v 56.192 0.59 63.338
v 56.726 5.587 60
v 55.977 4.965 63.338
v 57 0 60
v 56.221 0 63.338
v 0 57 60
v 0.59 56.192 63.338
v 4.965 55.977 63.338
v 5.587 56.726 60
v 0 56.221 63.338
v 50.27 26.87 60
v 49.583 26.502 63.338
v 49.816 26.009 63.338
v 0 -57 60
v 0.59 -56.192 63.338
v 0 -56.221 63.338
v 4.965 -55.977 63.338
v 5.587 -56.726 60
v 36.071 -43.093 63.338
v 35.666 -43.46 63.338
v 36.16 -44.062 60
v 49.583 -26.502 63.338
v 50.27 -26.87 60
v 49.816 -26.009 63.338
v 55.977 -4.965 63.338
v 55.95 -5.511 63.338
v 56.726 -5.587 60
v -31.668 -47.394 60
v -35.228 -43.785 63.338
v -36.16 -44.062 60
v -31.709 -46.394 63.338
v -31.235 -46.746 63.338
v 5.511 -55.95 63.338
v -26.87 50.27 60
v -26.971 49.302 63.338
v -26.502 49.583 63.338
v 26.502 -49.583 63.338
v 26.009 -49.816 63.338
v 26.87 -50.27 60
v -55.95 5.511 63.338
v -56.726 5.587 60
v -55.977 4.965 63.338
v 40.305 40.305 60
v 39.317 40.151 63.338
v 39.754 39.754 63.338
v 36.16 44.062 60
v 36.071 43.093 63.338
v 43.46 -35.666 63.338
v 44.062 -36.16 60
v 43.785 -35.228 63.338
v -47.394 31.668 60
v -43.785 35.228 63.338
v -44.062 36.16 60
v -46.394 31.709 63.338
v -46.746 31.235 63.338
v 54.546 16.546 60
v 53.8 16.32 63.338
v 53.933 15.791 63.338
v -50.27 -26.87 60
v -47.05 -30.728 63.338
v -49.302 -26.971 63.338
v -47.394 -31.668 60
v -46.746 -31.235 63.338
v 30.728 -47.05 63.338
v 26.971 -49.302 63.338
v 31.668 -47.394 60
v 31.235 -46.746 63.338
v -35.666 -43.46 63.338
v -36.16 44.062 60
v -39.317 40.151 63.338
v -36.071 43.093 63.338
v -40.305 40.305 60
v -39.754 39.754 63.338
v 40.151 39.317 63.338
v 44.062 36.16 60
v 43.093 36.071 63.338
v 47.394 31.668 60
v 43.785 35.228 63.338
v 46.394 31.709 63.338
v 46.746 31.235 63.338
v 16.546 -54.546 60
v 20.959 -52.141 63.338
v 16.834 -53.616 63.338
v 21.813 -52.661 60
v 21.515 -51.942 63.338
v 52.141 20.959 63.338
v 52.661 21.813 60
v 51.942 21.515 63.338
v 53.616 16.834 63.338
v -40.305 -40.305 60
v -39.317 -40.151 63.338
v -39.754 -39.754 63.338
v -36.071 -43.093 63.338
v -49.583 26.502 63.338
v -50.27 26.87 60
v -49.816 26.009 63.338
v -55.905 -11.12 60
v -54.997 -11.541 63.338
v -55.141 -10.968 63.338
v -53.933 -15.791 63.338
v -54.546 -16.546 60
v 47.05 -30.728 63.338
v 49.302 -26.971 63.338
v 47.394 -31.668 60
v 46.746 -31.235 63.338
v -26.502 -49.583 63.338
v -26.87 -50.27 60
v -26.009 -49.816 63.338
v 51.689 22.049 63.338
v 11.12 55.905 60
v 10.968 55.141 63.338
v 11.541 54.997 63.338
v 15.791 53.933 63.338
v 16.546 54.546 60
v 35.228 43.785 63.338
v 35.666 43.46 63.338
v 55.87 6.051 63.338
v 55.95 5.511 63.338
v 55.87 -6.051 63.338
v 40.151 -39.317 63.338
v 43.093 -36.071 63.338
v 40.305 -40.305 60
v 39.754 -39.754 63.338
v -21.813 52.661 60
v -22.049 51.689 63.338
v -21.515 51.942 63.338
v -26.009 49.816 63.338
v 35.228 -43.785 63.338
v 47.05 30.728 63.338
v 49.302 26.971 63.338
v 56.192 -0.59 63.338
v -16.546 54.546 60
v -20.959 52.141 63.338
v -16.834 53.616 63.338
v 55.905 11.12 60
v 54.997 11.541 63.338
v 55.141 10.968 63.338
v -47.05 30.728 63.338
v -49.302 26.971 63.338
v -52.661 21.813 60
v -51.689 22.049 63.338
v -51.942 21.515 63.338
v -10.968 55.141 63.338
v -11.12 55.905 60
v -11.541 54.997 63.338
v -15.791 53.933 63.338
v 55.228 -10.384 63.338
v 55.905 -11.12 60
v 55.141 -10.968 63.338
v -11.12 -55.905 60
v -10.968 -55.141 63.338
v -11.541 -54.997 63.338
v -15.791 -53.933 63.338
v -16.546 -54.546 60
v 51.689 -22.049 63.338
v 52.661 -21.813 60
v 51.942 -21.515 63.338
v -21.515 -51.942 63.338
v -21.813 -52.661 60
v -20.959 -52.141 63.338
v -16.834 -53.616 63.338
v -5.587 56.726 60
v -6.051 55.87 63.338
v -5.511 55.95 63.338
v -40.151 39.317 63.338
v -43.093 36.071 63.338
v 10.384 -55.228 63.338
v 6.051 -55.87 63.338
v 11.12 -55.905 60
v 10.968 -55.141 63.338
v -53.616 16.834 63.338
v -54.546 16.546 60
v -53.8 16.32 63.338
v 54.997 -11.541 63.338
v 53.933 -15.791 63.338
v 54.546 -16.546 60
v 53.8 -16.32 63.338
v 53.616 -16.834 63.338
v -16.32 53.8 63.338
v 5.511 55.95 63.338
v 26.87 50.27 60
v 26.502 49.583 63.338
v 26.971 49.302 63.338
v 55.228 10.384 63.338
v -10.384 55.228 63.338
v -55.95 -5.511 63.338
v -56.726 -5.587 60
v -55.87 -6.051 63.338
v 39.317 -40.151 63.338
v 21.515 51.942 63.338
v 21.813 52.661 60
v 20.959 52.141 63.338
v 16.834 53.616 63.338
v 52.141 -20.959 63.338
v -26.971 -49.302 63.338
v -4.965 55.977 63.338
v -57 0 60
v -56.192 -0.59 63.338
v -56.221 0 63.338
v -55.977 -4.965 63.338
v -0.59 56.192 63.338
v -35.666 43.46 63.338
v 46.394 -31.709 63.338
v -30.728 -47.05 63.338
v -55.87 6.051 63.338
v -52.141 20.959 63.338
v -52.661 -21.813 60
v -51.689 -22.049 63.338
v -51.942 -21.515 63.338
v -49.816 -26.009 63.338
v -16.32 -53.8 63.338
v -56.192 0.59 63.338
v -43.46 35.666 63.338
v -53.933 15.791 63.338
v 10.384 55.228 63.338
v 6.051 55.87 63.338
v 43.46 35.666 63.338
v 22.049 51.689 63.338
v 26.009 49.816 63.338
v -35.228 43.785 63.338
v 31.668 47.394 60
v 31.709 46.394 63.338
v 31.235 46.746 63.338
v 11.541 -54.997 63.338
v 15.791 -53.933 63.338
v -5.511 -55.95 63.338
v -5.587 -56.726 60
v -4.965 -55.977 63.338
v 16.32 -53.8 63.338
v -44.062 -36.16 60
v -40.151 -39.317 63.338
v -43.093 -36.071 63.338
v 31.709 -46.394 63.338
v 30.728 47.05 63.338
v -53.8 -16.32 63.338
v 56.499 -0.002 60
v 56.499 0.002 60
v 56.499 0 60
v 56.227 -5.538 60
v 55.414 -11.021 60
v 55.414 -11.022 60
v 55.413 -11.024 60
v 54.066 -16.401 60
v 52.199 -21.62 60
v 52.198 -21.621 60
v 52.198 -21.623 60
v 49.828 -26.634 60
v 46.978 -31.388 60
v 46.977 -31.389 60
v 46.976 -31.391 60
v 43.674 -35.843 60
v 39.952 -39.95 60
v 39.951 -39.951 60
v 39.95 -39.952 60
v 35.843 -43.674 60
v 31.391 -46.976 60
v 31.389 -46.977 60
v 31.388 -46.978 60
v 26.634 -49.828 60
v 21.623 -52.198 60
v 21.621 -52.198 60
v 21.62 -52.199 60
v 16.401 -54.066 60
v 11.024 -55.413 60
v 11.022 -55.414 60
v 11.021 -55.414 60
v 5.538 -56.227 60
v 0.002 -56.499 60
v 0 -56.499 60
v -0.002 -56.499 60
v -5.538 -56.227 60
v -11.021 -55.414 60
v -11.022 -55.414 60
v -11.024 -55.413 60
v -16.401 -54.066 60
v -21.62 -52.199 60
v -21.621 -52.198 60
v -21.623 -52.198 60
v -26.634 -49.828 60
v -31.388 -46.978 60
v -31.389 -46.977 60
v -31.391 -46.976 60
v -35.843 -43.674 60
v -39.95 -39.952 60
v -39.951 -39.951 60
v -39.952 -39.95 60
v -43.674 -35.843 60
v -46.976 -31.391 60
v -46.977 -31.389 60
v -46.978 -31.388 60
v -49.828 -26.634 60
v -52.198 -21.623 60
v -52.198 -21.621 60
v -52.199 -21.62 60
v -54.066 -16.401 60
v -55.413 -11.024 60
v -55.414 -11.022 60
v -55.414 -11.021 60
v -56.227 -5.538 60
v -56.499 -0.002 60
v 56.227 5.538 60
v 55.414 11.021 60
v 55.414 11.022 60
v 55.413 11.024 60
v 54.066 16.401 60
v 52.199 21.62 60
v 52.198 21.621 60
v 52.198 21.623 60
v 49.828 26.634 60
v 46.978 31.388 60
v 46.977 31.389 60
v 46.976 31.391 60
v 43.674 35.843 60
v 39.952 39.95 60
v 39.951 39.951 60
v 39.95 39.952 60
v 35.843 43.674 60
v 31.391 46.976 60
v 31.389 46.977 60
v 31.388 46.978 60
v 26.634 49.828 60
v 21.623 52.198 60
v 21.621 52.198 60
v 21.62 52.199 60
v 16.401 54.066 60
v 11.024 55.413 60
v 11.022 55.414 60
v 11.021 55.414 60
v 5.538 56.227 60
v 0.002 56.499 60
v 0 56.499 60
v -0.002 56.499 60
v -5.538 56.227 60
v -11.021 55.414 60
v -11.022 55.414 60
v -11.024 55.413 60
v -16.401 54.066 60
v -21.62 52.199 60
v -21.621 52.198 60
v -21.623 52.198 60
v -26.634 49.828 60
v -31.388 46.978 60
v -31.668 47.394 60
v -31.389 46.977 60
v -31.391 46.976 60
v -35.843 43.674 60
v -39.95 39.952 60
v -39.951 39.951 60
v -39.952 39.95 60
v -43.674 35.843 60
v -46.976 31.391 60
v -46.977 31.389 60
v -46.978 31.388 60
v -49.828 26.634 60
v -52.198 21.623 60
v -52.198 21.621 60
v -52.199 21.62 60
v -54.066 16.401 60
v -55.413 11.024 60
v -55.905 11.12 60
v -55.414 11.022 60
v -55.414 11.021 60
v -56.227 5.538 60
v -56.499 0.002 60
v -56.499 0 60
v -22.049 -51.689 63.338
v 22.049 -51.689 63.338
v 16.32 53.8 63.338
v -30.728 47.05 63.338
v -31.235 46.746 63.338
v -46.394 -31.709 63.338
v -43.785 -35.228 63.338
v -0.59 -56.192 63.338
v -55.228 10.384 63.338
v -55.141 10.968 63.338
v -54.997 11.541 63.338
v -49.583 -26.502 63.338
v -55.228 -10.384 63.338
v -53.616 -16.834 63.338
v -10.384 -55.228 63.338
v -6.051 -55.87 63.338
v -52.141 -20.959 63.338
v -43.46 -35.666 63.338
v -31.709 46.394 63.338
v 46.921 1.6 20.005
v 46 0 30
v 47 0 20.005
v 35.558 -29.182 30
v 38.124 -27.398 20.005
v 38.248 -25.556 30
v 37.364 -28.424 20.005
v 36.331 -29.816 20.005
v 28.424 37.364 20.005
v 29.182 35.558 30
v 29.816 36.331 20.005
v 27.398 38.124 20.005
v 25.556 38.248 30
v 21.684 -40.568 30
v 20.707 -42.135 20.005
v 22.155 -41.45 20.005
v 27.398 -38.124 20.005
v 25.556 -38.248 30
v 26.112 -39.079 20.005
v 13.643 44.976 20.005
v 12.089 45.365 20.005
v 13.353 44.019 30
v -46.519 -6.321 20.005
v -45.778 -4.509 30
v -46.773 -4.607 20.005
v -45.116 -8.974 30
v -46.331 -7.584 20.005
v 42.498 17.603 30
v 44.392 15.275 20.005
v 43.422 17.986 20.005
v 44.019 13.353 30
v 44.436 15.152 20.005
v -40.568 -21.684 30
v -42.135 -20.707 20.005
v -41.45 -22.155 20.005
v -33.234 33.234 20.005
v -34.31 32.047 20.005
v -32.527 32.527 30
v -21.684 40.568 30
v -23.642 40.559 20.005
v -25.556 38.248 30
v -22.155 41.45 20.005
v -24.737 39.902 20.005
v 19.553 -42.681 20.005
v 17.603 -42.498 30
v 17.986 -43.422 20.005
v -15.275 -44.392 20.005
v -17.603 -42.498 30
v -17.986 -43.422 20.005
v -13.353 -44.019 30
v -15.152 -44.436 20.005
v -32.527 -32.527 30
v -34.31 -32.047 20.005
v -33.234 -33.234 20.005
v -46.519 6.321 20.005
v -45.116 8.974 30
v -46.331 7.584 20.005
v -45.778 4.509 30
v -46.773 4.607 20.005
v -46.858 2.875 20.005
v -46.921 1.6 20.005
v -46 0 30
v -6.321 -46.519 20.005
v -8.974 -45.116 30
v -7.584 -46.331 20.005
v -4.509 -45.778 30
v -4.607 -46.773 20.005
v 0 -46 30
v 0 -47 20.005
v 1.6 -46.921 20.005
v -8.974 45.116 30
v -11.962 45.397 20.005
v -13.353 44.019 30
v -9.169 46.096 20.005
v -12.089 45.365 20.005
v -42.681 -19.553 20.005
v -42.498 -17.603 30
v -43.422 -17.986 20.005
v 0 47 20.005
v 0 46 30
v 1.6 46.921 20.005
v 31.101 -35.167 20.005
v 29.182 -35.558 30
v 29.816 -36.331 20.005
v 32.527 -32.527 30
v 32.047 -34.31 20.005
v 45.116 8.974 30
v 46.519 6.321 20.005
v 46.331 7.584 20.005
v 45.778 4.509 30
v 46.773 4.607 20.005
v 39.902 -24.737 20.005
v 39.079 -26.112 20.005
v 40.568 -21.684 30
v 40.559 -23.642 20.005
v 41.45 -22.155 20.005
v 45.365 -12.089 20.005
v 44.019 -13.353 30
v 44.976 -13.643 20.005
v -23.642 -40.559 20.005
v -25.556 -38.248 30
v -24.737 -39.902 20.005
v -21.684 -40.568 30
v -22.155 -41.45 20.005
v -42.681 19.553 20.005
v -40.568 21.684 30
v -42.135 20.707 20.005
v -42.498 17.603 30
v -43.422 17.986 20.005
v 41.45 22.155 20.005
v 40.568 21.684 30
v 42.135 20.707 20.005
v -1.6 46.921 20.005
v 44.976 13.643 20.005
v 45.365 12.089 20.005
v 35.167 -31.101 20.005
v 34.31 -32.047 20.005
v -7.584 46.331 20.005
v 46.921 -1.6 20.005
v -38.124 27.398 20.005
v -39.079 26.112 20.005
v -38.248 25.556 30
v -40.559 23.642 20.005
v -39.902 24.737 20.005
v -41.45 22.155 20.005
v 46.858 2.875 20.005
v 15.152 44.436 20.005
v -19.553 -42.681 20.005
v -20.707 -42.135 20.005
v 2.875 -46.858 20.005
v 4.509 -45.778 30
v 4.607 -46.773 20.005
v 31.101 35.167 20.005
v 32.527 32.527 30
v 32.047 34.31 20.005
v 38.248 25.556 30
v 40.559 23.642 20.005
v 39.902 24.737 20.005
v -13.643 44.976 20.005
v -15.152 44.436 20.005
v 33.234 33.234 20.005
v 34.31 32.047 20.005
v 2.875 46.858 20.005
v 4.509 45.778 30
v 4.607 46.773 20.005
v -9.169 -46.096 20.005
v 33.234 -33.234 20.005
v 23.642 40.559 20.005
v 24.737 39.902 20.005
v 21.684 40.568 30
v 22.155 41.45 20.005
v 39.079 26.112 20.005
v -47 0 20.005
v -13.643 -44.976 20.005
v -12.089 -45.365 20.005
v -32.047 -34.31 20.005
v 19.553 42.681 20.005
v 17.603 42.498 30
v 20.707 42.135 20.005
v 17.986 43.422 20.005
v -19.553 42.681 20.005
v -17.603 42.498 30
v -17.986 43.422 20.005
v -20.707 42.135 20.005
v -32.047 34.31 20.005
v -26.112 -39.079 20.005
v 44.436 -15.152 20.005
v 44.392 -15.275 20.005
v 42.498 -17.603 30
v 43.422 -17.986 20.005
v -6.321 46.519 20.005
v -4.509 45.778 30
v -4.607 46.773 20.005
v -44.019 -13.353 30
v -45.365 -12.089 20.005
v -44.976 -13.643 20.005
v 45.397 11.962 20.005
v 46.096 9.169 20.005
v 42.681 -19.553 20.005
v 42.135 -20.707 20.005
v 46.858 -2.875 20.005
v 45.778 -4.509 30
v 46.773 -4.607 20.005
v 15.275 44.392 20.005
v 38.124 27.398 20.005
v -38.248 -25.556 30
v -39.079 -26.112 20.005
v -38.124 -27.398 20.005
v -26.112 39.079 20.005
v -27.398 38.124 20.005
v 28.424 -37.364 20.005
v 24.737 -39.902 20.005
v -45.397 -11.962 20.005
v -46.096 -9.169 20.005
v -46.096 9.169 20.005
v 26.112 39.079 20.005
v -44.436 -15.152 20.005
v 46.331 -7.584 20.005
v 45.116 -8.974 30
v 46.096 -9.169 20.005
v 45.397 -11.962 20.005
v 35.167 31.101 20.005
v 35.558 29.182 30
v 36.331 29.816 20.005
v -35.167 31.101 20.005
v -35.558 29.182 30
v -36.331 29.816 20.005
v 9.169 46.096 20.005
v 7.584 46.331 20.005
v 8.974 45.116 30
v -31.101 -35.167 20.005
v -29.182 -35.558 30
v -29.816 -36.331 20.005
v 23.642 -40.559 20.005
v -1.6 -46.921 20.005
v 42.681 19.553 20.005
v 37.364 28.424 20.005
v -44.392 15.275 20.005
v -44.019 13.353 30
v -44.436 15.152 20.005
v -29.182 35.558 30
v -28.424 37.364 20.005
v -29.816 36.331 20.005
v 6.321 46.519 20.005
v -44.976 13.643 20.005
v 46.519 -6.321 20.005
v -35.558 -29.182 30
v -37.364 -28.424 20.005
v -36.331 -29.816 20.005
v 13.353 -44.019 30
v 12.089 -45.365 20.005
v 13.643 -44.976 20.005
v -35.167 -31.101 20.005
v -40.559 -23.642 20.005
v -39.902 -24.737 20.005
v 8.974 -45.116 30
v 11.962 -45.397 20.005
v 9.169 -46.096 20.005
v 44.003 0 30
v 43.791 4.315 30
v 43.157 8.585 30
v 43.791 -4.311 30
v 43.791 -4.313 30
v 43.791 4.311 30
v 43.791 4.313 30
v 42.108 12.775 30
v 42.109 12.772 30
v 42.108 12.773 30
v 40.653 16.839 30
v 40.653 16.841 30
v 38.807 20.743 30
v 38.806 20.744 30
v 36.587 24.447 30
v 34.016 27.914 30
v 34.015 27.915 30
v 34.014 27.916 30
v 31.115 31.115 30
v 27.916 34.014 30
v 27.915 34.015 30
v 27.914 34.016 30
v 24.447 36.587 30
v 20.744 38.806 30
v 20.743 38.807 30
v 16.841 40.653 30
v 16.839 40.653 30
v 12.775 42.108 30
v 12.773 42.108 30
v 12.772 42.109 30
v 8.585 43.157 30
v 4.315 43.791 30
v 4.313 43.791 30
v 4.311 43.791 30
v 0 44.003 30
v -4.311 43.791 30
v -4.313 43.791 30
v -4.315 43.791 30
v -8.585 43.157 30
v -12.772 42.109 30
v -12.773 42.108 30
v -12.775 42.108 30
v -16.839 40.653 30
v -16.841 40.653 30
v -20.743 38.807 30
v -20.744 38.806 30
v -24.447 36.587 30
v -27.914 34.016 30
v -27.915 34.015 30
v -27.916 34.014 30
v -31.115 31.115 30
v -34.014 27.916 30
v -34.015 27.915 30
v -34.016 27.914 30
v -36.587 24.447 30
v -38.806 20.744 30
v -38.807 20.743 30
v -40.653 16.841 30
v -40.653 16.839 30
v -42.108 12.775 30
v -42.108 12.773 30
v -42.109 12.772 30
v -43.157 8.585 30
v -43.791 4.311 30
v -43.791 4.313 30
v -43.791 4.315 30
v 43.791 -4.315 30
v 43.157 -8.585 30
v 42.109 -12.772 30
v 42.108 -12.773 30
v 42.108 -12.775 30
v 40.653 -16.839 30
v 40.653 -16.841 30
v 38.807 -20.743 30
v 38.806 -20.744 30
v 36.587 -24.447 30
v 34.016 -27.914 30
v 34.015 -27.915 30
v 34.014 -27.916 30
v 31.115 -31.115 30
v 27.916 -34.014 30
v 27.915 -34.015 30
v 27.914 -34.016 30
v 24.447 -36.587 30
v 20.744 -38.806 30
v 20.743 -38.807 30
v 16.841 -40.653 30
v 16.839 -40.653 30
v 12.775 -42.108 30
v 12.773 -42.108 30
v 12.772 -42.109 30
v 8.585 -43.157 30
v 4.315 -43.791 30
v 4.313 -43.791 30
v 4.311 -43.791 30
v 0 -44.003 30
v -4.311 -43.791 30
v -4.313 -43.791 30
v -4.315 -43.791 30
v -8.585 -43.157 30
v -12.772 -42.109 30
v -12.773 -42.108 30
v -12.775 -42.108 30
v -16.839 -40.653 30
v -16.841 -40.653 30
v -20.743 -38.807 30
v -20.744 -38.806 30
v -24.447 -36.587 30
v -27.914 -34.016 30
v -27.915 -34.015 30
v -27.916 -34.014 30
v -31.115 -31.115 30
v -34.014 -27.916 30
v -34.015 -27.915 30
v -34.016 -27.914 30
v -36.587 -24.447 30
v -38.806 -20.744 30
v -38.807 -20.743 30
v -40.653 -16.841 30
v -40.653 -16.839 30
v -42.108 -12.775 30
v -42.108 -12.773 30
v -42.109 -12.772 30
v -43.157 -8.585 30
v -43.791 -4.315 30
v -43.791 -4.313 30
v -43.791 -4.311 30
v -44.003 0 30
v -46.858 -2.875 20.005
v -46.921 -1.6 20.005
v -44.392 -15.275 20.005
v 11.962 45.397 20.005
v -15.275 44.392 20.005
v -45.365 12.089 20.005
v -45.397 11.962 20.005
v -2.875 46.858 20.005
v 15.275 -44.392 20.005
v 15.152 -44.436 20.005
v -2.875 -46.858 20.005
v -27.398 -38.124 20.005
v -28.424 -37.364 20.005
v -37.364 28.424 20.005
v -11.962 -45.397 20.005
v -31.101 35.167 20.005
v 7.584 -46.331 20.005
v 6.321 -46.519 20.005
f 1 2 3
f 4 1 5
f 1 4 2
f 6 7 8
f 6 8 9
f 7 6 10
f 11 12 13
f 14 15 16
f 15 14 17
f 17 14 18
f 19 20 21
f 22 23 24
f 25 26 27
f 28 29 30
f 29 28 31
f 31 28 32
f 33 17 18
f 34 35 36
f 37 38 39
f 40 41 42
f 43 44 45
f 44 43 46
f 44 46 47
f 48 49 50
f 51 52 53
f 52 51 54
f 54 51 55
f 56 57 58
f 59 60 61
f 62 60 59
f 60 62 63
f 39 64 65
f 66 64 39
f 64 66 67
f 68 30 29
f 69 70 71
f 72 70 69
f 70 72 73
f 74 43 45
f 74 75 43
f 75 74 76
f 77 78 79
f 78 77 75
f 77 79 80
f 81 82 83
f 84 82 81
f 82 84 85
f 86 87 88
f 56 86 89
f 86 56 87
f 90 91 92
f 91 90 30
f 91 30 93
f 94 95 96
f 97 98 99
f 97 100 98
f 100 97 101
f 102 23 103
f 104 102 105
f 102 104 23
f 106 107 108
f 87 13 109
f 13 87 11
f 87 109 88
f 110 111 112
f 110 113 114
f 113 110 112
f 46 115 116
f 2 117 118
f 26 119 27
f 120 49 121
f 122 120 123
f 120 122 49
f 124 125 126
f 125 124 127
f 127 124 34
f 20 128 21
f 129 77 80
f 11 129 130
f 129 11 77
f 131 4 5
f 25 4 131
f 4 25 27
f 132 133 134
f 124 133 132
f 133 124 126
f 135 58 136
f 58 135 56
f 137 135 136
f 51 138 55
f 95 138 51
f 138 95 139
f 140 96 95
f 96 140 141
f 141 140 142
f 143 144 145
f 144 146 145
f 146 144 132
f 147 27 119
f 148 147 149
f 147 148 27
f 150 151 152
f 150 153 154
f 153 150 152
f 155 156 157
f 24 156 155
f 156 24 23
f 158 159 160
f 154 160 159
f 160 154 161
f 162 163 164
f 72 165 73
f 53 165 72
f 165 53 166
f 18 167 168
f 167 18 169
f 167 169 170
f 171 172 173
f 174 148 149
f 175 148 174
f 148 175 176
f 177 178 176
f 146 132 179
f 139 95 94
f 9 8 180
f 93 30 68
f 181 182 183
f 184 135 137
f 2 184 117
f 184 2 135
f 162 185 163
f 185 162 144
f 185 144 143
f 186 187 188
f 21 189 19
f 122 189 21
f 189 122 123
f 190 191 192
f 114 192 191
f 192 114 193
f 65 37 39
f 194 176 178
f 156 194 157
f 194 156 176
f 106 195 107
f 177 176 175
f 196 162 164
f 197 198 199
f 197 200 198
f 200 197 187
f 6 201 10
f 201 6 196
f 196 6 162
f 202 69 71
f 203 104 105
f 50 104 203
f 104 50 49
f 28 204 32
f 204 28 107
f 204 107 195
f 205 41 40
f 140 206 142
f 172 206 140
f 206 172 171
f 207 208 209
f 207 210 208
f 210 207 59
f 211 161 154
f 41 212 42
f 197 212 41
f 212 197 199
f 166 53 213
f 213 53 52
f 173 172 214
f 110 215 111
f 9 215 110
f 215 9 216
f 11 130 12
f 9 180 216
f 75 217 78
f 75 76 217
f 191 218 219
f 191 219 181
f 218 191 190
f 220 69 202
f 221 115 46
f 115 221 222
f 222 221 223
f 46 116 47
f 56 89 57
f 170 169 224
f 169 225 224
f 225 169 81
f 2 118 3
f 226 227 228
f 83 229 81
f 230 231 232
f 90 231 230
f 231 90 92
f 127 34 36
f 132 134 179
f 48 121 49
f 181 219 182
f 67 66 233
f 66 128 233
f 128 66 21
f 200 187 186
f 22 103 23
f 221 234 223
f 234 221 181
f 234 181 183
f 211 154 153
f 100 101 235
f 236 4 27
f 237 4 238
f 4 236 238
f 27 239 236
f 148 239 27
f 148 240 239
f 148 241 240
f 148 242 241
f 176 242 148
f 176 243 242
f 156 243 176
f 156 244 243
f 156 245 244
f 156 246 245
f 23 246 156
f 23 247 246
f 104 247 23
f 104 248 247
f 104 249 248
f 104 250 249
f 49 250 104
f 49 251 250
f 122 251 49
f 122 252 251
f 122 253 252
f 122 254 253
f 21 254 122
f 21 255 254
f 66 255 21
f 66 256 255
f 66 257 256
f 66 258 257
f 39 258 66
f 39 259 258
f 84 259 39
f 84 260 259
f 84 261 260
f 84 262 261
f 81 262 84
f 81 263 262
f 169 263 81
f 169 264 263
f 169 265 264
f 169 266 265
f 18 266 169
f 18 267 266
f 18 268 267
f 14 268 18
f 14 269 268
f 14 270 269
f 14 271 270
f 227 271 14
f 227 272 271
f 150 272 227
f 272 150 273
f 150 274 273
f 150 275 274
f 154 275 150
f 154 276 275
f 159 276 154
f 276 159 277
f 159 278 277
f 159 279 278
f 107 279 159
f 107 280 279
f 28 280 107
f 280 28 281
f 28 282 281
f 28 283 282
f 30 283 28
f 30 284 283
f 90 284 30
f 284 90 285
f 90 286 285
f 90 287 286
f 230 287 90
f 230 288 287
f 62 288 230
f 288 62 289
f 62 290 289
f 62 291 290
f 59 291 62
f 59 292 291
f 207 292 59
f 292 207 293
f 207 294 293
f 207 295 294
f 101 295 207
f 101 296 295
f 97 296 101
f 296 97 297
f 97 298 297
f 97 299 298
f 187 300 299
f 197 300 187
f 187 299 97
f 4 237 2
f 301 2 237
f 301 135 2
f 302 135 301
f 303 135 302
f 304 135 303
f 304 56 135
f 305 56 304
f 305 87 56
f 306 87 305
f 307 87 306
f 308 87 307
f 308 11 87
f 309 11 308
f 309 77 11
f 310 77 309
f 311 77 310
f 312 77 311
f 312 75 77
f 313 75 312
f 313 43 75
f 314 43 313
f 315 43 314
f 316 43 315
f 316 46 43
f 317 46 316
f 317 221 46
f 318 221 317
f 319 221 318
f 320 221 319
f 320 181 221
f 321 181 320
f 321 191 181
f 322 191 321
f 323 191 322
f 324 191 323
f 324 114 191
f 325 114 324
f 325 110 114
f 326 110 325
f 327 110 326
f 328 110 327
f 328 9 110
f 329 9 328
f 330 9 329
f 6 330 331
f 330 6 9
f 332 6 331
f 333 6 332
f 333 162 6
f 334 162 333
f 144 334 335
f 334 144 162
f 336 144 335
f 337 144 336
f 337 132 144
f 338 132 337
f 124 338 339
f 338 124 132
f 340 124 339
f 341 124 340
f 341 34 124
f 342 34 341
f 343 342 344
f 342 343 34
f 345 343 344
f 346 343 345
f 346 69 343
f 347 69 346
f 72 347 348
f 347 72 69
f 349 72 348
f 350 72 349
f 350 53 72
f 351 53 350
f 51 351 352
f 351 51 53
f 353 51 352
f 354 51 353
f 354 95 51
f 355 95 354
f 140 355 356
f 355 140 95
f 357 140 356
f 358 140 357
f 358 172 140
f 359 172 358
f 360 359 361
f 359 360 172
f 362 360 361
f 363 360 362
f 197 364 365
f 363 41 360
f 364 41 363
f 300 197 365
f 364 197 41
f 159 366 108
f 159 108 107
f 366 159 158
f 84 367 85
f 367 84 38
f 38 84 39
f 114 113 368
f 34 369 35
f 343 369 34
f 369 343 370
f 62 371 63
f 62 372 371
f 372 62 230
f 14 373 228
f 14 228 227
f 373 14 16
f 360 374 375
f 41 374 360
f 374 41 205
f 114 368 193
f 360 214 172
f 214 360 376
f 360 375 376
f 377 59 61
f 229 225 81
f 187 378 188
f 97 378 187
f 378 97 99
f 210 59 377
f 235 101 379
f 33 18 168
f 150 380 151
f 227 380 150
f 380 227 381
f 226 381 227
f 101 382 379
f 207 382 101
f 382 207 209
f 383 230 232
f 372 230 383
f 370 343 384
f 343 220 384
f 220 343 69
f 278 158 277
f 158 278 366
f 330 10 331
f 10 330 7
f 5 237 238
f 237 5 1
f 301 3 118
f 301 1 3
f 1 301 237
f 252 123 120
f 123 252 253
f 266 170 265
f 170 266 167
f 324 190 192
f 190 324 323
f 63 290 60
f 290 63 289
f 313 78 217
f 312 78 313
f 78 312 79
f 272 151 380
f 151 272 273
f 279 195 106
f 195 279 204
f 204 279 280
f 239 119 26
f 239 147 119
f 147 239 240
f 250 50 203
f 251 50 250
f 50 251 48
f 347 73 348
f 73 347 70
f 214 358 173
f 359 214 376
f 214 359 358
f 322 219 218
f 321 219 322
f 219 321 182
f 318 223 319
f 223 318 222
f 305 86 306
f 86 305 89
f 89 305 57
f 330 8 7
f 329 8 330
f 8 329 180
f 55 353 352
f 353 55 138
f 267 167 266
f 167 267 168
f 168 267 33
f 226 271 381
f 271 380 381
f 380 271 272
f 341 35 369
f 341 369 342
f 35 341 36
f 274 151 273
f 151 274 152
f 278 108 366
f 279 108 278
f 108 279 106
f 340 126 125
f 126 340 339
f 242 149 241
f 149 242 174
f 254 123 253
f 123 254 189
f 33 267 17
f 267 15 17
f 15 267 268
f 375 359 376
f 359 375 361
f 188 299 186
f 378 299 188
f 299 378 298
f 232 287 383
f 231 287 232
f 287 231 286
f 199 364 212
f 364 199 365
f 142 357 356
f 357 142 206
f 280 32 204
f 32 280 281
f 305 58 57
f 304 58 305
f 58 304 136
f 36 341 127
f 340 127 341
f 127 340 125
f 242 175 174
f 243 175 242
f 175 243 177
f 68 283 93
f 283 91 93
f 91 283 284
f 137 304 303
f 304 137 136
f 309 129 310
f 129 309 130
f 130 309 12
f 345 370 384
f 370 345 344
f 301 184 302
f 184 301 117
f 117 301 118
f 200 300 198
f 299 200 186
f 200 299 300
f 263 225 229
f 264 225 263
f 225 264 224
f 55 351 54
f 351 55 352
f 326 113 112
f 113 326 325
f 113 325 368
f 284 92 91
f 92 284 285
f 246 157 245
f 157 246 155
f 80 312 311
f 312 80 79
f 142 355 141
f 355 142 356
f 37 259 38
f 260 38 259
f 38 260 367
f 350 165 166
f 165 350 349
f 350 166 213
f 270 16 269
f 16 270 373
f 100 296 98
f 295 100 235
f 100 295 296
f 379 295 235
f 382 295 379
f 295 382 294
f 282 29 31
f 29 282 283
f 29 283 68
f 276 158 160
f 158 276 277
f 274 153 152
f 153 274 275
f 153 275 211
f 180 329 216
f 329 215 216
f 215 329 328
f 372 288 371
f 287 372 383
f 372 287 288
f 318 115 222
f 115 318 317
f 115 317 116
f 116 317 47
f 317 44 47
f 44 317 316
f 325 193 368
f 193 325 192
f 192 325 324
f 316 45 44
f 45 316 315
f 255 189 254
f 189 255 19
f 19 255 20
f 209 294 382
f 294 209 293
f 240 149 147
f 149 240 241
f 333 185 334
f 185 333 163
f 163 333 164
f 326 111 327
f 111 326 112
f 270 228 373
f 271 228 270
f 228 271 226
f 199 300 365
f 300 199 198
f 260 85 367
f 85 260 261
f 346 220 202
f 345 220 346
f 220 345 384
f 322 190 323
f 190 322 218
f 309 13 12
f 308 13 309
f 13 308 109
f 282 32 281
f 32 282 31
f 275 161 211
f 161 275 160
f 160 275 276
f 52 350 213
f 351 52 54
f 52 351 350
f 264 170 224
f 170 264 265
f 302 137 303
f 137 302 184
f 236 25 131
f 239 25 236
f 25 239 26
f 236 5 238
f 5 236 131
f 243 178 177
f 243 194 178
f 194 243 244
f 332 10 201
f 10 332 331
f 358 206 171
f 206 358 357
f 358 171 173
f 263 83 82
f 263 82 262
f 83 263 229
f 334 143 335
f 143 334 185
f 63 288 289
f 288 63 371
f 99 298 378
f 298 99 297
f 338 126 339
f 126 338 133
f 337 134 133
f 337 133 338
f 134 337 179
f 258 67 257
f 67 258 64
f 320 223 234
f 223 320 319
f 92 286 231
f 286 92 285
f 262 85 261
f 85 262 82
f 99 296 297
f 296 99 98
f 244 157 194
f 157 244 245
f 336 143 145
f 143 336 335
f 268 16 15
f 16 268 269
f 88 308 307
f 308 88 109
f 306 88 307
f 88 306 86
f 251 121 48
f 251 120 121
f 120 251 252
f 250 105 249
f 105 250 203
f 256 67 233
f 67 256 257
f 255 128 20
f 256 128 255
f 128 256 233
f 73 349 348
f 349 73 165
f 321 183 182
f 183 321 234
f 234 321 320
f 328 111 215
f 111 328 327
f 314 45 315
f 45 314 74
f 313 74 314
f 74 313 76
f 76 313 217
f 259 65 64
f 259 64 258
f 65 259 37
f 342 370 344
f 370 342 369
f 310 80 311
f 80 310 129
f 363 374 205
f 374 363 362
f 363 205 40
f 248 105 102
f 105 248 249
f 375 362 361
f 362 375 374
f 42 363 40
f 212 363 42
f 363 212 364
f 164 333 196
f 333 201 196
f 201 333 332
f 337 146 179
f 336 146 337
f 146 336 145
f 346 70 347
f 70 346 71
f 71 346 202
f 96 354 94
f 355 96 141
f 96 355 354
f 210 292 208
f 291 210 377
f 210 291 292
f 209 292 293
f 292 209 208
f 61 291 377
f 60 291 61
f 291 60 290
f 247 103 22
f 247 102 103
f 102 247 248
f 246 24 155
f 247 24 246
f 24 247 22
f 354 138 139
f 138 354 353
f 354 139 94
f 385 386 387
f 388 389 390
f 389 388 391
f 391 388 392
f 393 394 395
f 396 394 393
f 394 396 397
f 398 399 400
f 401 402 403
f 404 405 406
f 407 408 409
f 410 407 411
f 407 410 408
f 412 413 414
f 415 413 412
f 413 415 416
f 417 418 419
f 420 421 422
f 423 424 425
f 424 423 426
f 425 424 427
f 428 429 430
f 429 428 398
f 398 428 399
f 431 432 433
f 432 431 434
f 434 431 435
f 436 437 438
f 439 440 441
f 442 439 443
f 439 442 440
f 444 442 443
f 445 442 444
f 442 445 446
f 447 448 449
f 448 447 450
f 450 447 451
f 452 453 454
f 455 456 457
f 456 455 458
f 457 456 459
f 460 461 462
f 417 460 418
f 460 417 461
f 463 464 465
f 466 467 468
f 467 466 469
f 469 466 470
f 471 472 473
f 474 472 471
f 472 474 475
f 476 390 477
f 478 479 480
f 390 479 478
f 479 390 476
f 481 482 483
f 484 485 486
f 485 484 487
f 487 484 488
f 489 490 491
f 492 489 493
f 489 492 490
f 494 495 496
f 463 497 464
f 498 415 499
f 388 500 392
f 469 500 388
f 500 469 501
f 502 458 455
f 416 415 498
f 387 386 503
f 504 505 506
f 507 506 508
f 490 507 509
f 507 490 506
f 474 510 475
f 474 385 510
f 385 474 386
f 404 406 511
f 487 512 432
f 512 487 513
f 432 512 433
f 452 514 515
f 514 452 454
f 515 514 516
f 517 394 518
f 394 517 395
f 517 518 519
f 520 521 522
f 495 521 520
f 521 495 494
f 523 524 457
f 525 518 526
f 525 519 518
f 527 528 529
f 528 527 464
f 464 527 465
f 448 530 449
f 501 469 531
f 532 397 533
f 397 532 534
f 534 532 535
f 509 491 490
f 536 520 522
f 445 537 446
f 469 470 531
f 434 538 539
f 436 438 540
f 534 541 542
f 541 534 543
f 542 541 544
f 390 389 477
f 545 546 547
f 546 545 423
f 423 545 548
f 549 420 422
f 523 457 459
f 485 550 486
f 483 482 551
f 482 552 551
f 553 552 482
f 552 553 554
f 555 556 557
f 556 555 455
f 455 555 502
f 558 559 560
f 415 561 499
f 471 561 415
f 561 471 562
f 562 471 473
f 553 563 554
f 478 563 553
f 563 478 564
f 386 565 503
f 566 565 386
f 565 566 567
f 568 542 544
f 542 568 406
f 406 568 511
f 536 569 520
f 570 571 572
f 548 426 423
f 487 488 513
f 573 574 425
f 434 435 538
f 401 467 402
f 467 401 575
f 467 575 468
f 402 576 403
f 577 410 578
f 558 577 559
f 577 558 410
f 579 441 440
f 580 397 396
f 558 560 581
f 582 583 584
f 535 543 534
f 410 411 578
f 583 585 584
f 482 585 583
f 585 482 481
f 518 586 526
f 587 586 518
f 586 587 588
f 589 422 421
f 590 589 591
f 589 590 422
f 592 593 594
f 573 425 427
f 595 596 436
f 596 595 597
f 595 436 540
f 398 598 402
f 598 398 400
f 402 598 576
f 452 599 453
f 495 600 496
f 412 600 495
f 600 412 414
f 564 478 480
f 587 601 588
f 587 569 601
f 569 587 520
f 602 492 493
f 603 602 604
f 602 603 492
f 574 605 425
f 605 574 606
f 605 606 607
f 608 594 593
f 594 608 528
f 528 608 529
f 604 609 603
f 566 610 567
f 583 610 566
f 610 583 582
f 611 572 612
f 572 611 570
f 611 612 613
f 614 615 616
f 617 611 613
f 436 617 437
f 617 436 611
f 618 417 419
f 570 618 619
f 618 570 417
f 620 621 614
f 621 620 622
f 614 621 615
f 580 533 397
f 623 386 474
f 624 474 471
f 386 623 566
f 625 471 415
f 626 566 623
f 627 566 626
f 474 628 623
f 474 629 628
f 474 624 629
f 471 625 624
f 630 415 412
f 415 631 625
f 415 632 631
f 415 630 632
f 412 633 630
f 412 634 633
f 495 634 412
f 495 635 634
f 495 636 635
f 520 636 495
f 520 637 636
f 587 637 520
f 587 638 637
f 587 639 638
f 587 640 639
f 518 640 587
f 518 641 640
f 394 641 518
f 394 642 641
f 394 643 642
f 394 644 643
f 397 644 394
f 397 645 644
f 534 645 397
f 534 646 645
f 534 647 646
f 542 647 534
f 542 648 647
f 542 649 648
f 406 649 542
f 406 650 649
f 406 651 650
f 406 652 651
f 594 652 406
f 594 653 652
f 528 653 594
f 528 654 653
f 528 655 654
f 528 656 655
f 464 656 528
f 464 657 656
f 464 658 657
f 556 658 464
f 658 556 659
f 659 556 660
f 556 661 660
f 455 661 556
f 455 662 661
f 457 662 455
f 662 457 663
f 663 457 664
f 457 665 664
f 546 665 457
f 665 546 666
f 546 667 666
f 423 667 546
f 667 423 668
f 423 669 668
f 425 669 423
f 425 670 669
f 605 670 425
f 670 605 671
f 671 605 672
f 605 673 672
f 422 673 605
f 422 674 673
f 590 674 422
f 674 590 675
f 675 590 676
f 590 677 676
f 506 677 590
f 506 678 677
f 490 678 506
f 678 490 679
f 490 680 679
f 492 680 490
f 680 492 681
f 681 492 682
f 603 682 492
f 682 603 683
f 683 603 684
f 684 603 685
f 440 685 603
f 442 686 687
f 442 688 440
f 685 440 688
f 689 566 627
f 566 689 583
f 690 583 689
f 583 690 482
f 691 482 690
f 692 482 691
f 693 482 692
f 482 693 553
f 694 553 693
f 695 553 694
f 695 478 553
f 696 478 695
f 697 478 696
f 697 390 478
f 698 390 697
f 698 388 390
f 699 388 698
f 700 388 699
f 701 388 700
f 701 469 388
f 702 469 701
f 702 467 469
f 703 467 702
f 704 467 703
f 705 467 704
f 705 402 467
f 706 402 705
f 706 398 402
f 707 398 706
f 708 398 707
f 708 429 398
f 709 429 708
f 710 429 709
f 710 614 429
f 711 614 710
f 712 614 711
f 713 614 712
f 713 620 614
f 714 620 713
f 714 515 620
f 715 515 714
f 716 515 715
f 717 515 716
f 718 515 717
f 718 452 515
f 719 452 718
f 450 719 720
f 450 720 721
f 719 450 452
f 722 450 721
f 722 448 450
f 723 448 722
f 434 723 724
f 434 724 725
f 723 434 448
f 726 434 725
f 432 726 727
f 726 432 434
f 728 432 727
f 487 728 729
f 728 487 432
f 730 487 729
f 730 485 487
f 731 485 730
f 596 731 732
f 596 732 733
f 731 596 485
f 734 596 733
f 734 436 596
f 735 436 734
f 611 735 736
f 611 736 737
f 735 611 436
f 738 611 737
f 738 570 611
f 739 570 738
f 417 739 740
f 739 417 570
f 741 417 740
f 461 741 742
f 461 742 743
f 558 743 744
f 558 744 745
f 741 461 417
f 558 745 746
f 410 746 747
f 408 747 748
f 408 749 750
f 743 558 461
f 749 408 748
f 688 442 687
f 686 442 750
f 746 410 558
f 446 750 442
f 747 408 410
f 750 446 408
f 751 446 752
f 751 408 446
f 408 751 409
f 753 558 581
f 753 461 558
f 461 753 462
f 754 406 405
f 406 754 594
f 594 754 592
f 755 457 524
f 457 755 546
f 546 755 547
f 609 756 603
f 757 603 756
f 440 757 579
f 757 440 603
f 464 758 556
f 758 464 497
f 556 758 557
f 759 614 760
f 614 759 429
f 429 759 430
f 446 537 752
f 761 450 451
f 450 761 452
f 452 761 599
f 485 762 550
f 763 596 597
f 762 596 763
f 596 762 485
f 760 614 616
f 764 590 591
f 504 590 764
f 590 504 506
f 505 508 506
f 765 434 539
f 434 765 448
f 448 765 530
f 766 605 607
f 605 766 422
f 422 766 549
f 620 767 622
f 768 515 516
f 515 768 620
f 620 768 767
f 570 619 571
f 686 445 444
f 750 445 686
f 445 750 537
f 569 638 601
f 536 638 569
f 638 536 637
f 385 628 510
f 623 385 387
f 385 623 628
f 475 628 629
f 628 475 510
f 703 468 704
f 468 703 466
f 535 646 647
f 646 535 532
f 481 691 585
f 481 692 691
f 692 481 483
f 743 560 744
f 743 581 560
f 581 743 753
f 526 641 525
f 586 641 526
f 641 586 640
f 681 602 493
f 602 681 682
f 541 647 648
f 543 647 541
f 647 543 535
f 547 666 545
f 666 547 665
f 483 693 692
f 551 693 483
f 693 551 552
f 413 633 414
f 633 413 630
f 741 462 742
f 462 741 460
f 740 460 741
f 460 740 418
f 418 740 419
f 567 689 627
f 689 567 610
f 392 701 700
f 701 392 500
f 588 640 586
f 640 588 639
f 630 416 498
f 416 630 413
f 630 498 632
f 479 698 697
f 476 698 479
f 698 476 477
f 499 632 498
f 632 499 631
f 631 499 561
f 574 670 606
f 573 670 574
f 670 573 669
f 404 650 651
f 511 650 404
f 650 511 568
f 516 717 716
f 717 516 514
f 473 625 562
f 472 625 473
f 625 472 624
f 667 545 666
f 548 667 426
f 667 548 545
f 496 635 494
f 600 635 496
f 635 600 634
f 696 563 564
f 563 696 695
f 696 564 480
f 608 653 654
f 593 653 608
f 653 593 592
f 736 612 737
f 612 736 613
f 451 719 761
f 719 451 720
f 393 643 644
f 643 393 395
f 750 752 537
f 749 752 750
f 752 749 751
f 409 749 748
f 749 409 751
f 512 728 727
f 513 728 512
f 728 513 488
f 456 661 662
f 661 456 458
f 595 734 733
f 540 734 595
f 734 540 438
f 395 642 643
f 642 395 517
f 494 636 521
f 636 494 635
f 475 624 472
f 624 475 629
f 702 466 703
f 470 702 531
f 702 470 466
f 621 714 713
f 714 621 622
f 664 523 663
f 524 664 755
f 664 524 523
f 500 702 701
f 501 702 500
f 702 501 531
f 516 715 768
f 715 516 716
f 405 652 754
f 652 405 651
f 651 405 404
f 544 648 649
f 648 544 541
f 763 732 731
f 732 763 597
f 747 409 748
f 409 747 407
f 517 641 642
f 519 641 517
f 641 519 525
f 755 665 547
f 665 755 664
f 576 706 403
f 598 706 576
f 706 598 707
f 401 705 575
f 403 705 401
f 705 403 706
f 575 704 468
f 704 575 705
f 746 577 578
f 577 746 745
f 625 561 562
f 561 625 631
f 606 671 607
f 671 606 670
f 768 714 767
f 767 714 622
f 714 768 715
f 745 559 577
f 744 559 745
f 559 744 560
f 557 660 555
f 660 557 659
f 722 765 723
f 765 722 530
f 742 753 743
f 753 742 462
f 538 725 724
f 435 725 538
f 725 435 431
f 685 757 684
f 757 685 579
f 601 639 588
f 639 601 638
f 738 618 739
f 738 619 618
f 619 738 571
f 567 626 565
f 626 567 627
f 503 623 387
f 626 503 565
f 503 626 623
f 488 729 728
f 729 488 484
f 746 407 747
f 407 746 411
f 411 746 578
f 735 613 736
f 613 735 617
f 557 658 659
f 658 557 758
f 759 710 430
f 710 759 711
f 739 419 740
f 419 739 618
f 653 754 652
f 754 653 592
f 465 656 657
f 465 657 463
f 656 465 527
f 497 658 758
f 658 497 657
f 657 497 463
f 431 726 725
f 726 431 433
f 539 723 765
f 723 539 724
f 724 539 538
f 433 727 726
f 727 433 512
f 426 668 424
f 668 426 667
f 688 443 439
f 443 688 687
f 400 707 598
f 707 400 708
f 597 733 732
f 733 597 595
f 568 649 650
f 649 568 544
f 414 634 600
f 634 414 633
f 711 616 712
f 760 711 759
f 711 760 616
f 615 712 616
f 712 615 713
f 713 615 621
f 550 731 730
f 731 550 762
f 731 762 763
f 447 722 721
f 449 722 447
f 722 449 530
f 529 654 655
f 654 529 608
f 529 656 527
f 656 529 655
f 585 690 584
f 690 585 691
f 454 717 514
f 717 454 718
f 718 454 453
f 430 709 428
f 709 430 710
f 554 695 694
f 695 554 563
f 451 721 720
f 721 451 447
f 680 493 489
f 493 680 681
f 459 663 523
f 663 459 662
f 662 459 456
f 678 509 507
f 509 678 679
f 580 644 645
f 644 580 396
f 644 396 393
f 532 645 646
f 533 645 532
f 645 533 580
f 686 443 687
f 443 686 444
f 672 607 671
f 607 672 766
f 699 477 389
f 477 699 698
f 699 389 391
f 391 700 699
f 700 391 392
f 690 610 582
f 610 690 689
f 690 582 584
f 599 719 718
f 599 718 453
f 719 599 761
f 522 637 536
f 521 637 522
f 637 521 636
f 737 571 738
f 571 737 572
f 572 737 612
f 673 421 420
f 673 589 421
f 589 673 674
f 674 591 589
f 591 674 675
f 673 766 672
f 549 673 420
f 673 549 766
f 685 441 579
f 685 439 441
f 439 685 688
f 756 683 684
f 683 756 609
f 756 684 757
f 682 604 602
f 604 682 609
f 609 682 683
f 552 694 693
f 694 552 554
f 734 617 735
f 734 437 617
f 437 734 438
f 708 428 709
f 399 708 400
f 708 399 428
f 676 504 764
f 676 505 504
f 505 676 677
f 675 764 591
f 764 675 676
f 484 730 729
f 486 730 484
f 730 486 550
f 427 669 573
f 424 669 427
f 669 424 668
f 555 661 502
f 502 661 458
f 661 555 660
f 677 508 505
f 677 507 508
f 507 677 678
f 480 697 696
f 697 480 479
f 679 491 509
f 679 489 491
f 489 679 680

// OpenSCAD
include <../libs/pw_primitives.scad>;

// AEG sander fitting diameters
d1=34.25; r1=d1/2;
d2=37.4;  r2=d2/2;
d3=55.0;  r3=d3/2;
d4=60.5;  r4=d4/2;
d5=64.5;  r5=d5/2;
d6=68.75; r6=d6/2;
// AEG sander fitting lengths
l1=6.1;
l2=11.5;
l3=15.0;
l4=20.0;
l5=30.0;
twist=1; // set to -1 for other direction
// Derived fitting measurements
t1=r2-r1;   // Thickness of wall
br=2.5;     // Locking ball radius
ba=15;      // Locking ball channel angle
// Hose attachment diameters and radii
dhi=34; rhi=dhi/2; 
dho=38; rho=dho/2;
spike_thick=1;  // Extra protrusion of 'spike' holding hose in place.
halen=30;
// Middle measurements
midlen=30;

$fn=64;
// AEG fitting
module aeg_hose_fitting_fitting() {
    translate([0, 0, halen+midlen]) union() {
        pipe_oi(l5, r2+t1, r2);
        // pipe_oi(3, r4, r2+t1);
        difference() {
            pipe_oi(l4, r6, r4);
            // +x side
            translate([0, 0, l2]) rotate([0, 0, 0]) union() {
                translate([r4, 0, 0]) cylinder(h=l4-l2+0.1,r=br);
                translate([r4, 0, 0]) sphere(r=br);
                rotate_extrude(angle=ba*twist) { translate([r4, 0, 0]) circle(r=br); }
                rotate([0, 0, ba*twist]) translate([r4, 0, 0]) sphere(r=br);
            }
            // -x side
            translate([0, 0, l2]) rotate([0, 0, 180]) union() {
                translate([r4, 0, 0]) cylinder(h=l4-l2+0.1,r=br);
                translate([r4, 0, 0]) sphere(r=br);
                rotate_extrude(angle=ba*twist) { translate([r4, 0, 0]) circle(r=br); }
                rotate([0, 0, ba*twist]) translate([r4, 0, 0]) sphere(r=br);
            }
        }
    }
    // Hose fitting
    hollow_cone_oi(halen/2, rho, rho+spike_thick, rhi, rhi);
    translate([0, 0, halen/2]) pipe_oi(halen/2, rho, rhi);
    // Middle
    translate([0, 0, halen]) hollow_cone_oi(midlen, rho, r6, rhi, r2);
}

module shopvac_silicone_hose_fitting() {
    translate([0, 0, 60]) hollow_cone_oi(30, 57, 56.5, 50, 54);
    translate([0, 0, 30]) hollow_cone_oi(30, 53, 57, 44, 50);
    translate([0, 0, 0]) hollow_cone_oi(30, 49, 53, 46, 44);
}

shopvac_silicone_hose_fitting();
